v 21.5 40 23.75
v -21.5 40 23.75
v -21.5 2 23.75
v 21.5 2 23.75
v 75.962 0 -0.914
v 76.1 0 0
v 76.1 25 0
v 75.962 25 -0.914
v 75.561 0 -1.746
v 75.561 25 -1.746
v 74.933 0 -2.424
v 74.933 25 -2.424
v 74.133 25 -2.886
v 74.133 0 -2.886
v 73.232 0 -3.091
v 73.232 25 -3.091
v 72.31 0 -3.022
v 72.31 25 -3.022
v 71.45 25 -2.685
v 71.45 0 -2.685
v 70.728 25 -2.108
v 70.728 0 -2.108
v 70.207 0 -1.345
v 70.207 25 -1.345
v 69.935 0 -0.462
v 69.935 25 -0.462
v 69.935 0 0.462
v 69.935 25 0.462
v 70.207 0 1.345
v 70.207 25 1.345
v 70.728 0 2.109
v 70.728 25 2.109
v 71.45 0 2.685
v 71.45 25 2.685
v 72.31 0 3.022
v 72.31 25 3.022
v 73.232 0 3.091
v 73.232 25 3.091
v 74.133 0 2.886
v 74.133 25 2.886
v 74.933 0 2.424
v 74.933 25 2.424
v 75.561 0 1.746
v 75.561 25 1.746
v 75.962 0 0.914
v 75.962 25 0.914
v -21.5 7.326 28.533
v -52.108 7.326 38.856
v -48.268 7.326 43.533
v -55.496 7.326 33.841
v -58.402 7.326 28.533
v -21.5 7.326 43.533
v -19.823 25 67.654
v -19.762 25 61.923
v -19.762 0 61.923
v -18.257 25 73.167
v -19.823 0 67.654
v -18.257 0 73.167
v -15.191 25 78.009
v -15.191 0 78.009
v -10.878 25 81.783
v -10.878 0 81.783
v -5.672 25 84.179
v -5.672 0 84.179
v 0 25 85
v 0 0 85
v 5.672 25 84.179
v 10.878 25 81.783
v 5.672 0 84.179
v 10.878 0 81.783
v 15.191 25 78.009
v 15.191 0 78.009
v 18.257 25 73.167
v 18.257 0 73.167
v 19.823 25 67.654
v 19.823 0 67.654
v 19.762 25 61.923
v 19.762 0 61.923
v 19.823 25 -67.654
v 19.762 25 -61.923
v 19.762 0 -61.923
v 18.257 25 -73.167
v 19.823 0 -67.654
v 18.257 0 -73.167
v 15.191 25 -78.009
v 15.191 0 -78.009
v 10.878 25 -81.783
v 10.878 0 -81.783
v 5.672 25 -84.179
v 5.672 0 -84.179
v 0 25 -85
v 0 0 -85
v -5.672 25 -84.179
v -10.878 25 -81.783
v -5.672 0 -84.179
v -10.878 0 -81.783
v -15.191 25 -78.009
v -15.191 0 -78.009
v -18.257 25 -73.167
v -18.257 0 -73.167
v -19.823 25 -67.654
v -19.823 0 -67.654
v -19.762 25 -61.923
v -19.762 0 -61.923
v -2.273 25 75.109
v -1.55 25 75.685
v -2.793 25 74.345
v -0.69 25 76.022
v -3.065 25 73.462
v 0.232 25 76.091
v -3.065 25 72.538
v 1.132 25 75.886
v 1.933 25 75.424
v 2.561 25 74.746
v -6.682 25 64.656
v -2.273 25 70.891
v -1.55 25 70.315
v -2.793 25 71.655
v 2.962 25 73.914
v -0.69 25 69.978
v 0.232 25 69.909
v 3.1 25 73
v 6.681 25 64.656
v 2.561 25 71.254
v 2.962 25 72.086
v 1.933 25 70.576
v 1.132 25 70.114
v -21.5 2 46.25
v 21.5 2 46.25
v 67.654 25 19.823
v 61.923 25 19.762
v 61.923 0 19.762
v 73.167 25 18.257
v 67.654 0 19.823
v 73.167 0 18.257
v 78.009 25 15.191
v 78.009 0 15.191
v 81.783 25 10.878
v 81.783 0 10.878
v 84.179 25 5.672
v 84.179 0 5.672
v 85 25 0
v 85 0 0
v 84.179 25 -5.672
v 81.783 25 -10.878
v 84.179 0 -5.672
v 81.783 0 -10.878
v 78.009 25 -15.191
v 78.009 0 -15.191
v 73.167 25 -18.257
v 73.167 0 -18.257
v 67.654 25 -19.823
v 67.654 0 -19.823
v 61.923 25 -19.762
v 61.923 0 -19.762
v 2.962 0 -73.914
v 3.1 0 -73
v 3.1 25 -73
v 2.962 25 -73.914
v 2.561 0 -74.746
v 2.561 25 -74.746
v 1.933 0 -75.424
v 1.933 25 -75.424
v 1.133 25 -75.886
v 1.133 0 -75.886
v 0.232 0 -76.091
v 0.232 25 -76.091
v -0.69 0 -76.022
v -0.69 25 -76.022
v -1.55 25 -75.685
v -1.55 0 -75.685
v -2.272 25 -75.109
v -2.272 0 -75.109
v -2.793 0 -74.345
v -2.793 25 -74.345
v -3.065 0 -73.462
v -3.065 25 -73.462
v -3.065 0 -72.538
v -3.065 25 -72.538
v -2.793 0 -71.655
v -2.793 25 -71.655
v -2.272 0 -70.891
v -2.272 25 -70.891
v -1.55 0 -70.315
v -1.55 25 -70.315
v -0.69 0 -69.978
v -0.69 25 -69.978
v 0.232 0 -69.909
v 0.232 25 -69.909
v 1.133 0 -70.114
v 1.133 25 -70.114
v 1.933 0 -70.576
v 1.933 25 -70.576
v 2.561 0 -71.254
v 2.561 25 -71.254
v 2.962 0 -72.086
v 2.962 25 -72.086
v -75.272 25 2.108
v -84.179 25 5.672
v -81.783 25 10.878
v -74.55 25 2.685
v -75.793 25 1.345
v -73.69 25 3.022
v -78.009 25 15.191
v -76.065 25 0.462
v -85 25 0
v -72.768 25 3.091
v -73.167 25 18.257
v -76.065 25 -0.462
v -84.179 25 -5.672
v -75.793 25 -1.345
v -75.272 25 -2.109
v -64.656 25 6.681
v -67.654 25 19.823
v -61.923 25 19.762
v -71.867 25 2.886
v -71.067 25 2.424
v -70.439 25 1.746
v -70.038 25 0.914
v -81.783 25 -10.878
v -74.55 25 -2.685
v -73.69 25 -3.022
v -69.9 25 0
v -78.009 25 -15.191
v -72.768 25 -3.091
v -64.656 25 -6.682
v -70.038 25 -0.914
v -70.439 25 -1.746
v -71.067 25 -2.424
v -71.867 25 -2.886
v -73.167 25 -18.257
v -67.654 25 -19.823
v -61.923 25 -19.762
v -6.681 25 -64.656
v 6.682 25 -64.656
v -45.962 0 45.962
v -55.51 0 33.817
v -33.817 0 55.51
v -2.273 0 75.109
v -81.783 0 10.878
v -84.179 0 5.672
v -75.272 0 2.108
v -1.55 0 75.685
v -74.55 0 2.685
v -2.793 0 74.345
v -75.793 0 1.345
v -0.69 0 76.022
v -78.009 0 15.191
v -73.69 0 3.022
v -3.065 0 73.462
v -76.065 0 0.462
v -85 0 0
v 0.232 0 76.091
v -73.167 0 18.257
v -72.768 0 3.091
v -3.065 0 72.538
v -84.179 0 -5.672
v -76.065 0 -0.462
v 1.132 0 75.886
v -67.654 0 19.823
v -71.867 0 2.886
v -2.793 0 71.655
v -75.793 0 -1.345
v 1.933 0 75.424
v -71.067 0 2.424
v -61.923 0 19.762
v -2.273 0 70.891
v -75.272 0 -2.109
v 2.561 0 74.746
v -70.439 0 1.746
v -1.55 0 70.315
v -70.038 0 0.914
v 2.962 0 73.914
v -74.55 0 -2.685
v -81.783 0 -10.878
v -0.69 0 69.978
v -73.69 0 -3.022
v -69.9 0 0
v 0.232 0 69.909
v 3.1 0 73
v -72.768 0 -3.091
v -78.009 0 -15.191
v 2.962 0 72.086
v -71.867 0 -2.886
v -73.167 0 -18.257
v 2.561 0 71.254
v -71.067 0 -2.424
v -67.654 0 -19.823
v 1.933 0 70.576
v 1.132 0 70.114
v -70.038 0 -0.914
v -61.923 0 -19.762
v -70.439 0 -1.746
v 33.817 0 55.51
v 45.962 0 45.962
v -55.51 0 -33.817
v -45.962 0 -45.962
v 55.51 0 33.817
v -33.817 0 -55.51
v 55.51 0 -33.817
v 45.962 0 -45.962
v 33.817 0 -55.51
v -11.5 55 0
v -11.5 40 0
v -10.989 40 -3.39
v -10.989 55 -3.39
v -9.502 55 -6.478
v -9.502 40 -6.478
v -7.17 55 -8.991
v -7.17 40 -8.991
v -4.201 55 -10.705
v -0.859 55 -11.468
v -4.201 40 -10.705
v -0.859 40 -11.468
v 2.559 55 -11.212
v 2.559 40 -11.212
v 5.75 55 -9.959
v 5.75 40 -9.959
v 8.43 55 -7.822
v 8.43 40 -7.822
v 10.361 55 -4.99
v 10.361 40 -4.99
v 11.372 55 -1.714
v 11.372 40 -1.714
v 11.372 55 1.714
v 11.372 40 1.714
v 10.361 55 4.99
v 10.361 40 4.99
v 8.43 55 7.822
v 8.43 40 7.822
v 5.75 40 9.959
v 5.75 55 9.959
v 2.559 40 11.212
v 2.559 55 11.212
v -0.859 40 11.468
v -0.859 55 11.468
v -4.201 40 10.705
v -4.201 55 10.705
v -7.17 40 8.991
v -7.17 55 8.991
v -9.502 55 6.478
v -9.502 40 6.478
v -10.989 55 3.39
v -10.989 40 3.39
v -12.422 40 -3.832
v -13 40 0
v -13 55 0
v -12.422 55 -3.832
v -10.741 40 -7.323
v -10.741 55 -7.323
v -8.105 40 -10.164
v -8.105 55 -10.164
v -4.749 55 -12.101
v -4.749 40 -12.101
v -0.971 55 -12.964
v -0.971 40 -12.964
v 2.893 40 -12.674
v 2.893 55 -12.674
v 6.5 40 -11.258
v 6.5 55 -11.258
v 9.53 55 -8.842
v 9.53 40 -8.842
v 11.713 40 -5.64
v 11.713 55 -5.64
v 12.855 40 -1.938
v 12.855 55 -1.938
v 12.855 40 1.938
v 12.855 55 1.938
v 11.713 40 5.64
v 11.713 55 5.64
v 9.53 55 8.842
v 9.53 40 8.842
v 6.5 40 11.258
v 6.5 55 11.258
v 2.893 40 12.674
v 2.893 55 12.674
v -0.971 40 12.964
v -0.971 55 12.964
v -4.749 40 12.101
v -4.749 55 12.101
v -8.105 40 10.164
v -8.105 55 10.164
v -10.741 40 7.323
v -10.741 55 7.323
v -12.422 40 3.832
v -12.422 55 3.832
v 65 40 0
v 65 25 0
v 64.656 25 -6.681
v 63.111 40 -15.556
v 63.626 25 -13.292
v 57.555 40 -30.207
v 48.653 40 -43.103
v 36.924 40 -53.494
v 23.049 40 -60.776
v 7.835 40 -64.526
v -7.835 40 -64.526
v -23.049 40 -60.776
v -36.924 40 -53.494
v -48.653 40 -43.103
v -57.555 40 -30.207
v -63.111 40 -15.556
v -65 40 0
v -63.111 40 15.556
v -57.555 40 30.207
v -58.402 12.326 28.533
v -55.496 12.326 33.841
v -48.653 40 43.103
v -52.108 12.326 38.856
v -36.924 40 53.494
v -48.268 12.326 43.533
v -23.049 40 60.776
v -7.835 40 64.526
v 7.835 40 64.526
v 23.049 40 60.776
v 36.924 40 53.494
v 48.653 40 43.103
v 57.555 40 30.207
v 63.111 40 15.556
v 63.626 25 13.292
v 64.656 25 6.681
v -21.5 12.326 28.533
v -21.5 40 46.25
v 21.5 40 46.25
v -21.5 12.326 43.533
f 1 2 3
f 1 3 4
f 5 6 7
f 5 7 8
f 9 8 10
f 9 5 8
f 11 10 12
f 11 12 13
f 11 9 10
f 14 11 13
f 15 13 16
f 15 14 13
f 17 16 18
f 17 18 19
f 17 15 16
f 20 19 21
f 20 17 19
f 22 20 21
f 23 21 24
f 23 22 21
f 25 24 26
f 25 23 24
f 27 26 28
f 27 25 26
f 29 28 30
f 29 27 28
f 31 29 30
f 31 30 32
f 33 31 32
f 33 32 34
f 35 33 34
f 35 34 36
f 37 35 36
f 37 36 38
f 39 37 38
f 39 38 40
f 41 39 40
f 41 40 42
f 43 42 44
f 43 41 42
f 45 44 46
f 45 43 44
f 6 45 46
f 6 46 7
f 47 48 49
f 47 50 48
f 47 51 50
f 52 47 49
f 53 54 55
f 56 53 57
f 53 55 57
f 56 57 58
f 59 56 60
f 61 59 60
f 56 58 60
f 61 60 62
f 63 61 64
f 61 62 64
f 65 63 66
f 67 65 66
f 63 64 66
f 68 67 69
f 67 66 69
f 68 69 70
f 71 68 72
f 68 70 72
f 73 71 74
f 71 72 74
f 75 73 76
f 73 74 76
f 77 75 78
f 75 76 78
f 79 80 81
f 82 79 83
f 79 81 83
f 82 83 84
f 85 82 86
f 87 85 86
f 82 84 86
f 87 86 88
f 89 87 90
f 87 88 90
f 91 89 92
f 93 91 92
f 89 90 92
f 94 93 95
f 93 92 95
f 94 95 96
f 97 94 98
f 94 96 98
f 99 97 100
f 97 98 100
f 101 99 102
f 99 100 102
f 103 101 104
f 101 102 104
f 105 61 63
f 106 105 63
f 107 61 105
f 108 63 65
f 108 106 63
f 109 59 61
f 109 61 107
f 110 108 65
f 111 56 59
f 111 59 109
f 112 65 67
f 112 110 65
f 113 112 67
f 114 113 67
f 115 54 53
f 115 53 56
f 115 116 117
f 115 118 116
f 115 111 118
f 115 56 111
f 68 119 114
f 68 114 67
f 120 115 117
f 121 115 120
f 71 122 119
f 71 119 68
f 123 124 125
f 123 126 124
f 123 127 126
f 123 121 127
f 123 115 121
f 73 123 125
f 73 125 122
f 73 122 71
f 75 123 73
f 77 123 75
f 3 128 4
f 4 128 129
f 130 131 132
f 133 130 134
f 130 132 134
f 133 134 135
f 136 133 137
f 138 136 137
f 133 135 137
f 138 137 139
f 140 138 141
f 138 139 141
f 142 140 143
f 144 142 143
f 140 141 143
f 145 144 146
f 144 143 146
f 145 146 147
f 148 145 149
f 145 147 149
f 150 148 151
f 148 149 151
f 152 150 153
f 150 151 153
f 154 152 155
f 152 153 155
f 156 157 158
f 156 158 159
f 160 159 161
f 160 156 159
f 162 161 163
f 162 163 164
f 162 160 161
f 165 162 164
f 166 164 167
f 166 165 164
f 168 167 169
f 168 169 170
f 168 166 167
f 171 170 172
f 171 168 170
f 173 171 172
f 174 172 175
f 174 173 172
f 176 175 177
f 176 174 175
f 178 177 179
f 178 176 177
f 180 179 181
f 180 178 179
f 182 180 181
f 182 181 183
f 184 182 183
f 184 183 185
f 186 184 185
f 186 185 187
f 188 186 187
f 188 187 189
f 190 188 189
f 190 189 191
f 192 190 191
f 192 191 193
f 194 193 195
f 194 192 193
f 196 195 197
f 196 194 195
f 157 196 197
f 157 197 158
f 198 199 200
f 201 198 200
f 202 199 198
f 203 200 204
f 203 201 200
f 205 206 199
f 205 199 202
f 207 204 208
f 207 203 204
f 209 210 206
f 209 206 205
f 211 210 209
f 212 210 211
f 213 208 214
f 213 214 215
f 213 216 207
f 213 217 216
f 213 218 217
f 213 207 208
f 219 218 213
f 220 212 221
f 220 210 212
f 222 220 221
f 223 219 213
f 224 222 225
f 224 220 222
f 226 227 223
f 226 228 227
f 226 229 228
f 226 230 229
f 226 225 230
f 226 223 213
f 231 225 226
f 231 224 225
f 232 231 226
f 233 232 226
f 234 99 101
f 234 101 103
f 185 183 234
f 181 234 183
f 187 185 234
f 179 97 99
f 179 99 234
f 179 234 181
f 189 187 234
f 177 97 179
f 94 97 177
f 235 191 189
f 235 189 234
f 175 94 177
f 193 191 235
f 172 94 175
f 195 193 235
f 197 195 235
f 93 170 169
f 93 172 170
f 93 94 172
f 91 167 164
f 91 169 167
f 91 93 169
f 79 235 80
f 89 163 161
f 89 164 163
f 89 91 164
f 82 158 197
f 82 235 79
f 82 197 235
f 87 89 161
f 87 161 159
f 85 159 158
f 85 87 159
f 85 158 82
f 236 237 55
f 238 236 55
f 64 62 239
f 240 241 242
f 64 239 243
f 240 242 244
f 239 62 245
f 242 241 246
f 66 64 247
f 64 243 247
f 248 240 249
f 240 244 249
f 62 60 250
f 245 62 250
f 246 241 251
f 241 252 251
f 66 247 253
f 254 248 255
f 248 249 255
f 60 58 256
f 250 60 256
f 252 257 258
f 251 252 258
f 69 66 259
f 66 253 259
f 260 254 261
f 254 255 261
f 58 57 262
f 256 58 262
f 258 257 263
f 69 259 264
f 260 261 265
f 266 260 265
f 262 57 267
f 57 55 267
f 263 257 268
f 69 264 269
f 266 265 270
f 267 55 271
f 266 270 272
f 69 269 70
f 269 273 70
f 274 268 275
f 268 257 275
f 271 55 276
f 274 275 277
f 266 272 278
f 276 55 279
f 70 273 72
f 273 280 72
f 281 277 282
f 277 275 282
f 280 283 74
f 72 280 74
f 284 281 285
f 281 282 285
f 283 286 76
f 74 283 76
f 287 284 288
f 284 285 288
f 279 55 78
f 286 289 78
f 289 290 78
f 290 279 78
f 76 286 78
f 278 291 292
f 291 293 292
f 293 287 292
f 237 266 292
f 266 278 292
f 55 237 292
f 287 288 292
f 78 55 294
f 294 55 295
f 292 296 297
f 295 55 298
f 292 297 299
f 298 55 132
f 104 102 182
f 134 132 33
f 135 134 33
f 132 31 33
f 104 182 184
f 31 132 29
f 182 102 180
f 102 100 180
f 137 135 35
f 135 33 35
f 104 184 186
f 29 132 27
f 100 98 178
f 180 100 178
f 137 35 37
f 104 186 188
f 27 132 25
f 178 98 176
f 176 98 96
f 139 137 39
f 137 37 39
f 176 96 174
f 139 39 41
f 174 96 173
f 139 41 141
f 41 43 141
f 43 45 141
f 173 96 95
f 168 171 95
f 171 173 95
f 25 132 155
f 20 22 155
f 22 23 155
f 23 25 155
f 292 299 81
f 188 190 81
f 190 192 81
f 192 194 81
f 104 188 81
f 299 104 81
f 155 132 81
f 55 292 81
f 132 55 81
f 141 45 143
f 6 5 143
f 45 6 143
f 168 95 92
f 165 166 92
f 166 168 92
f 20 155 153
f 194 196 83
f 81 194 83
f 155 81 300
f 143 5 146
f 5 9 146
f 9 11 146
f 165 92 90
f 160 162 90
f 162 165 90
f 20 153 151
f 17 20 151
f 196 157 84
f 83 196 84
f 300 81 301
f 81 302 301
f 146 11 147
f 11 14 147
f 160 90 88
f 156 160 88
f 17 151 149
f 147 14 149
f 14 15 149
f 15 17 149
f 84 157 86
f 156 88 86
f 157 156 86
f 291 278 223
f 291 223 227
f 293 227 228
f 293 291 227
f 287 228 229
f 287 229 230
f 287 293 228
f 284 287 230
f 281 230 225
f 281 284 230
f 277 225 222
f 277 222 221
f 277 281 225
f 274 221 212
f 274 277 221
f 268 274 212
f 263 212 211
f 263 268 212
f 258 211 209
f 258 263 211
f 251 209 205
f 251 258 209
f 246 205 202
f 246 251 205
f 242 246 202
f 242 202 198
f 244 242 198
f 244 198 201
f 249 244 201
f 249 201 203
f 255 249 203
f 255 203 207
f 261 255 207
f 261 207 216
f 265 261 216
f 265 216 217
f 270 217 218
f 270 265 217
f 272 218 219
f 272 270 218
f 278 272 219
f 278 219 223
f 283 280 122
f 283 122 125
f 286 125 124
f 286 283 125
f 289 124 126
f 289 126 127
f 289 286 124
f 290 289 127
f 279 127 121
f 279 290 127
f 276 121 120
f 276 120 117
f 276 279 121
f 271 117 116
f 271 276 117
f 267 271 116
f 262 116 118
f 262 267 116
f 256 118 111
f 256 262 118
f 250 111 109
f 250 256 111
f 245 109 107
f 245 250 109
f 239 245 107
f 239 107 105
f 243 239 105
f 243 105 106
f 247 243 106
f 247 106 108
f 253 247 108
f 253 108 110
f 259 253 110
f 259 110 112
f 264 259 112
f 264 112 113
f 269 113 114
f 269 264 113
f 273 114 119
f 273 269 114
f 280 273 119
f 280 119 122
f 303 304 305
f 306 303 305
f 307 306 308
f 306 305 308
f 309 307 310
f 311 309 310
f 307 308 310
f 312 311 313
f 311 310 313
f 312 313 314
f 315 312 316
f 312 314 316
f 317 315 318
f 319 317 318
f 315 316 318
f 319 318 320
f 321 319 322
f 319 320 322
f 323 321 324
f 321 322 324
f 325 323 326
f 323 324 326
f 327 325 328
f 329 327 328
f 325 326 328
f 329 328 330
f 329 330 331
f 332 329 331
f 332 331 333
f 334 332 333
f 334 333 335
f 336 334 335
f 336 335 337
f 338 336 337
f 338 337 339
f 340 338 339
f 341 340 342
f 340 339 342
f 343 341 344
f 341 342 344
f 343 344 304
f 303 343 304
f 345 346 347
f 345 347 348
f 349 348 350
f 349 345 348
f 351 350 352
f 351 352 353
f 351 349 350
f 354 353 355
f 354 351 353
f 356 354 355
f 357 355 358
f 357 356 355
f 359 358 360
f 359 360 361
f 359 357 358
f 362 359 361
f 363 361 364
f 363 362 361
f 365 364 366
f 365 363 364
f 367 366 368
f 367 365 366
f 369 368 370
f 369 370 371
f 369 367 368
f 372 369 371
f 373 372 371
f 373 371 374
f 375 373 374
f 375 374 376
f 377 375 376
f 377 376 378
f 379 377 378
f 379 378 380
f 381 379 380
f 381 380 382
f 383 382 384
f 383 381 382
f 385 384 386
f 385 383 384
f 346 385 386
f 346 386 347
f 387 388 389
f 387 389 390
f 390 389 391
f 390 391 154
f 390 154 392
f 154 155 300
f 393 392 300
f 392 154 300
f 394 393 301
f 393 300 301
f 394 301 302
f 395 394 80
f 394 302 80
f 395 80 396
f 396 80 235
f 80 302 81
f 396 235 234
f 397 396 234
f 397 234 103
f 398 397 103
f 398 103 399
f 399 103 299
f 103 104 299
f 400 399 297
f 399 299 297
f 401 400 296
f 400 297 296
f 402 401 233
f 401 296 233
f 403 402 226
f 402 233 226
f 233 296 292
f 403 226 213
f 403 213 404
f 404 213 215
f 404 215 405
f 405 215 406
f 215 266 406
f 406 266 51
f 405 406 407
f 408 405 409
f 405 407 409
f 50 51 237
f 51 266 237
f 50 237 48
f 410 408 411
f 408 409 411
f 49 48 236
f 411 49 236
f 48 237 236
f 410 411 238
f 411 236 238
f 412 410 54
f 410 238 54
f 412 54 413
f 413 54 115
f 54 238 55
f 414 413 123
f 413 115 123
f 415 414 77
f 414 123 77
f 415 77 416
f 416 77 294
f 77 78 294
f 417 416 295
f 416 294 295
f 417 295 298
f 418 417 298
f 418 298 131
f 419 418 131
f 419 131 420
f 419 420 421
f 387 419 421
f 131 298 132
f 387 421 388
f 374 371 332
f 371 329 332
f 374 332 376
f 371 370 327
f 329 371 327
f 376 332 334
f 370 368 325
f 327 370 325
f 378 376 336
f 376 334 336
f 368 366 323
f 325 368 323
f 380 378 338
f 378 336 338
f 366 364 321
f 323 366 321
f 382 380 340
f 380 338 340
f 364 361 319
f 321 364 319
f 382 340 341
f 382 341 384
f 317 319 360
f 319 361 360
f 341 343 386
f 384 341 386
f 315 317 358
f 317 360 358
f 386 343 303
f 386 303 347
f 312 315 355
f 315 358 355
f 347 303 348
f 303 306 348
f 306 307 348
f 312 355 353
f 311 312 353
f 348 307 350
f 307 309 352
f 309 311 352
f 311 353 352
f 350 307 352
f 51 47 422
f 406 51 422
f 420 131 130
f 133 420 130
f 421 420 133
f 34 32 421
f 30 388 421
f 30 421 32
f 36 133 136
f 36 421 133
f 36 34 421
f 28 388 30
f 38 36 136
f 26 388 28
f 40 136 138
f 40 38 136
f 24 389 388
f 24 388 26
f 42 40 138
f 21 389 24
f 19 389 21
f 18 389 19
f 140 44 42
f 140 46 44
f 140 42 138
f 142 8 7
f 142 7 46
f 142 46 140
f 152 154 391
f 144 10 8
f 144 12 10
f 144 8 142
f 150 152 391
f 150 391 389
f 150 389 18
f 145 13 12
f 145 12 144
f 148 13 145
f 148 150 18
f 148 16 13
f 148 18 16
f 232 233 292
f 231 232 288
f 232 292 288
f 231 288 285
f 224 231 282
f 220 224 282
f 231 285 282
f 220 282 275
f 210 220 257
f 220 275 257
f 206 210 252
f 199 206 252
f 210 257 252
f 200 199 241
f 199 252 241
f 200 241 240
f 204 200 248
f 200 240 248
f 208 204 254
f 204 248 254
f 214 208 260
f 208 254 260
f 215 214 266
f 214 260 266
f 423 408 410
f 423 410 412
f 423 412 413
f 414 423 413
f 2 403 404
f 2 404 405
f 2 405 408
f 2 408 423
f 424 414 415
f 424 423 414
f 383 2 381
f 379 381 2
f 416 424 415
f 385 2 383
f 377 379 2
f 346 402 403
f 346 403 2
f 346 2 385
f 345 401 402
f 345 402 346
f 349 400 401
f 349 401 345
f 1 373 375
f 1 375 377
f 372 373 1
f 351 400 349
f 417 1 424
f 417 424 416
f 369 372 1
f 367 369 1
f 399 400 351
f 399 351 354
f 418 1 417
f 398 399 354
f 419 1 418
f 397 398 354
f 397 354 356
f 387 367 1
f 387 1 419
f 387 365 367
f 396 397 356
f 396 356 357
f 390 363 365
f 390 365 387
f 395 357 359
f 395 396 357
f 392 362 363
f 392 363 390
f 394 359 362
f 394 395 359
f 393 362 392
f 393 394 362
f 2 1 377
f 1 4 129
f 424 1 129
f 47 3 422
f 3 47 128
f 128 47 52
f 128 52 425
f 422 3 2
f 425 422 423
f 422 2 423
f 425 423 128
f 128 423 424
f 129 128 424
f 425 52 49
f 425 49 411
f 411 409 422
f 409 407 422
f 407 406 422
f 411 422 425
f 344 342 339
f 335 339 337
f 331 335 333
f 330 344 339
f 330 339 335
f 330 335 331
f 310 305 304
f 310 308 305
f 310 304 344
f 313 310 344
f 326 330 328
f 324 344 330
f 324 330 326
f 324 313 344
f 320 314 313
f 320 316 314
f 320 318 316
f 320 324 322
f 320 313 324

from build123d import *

# Parameters (mm, degrees)
SKETCH2_R           = 65
BOSS_EXTRUDE1_DEPTH = 40
SKETCH4_W           = 43
SKETCH4_H           = 22.5
CUT_EXTRUDE1_DEPTH  = 38
SKETCH6_R           = 3.1
BOSS_EXTRUDE2_DEPTH = 25
SKETCH9_R           = 13
SKETCH9_R_2         = 11.5
BOSS_EXTRUDE3_DEPTH = 15
SKETCH5_W           = 15
SKETCH5_H           = 5
CUT_EXTRUDE2_DEPTH  = 60


with BuildPart() as part:
    # Sketch2 → Boss-Extrude1 (new body)
    with BuildSketch(Plane(origin=(0, 0, 0), x_dir=(1, 0, 0), z_dir=(0, 1, 0))):
        Circle(SKETCH2_R)
    extrude(amount=BOSS_EXTRUDE1_DEPTH)

    # Sketch4 → Cut-Extrude1 (cut)
    with BuildSketch(Plane.XZ.offset(-40)):
        with Locations((0, 35)):
            Rectangle(SKETCH4_W, SKETCH4_H)
    extrude(amount=CUT_EXTRUDE1_DEPTH, mode=Mode.SUBTRACT)

    # Sketch6 → Boss-Extrude2 (add)
    with BuildSketch(Plane(origin=(0, 0, 0), x_dir=(1, 0, 0), z_dir=(0, 1, 0))):
        with BuildLine():
            ThreePointArc((-61.923102255, -19.761816899), (-65, 8.332e-05), (-61.923051591, 19.761975651))
            ThreePointArc((-61.923051591, 19.761975651), (-85, 0.000108957), (-61.923102255, -19.761816899))
        make_face()
        with Locations((-73, 8.332e-05)):
            Circle(SKETCH6_R, mode=Mode.SUBTRACT)
        with BuildLine():
            ThreePointArc((19.761975651, 61.923051591), (0.000108957, 85), (-19.761816899, 61.923102255))
            ThreePointArc((-19.761816899, 61.923102255), (8.332e-05, 65), (19.761975651, 61.923051591))
        make_face()
        with Locations((8.332e-05, 73)):
            Circle(SKETCH6_R, mode=Mode.SUBTRACT)
        with BuildLine():
            ThreePointArc((19.761816899, -61.923102255), (-8.332e-05, -65), (-19.761975651, -61.923051591))
            ThreePointArc((-19.761975651, -61.923051591), (-0.000108957, -85), (19.761816899, -61.923102255))
        make_face()
        with Locations((-8.332e-05, -73)):
            Circle(SKETCH6_R, mode=Mode.SUBTRACT)
        with BuildLine():
            ThreePointArc((61.923051591, -19.761975651), (85, -0.000108957), (61.923102255, 19.761816899))
            ThreePointArc((61.923102255, 19.761816899), (65, -8.332e-05), (61.923051591, -19.761975651))
        make_face()
        with Locations((73, -8.332e-05)):
            Circle(SKETCH6_R, mode=Mode.SUBTRACT)
    extrude(amount=BOSS_EXTRUDE2_DEPTH)

    # Sketch9 → Boss-Extrude3 (add)
    with BuildSketch(Plane(origin=(0, 40, 0), x_dir=(-1, 0, 0), z_dir=(0, -1, 0))):
        Circle(SKETCH9_R)
        Circle(SKETCH9_R_2, mode=Mode.SUBTRACT)
    extrude(amount=-BOSS_EXTRUDE3_DEPTH)

    # Sketch5 → Cut-Extrude2 (cut)
    with BuildSketch(Plane(origin=(-21.5, 0, 62.75), x_dir=(0, 0, 1), z_dir=(-1, 0, 0))):
        with Locations((-26.716652448, 9.82604923)):
            Rectangle(SKETCH5_W, SKETCH5_H)
    extrude(amount=CUT_EXTRUDE2_DEPTH, mode=Mode.SUBTRACT)


solid = part.part
